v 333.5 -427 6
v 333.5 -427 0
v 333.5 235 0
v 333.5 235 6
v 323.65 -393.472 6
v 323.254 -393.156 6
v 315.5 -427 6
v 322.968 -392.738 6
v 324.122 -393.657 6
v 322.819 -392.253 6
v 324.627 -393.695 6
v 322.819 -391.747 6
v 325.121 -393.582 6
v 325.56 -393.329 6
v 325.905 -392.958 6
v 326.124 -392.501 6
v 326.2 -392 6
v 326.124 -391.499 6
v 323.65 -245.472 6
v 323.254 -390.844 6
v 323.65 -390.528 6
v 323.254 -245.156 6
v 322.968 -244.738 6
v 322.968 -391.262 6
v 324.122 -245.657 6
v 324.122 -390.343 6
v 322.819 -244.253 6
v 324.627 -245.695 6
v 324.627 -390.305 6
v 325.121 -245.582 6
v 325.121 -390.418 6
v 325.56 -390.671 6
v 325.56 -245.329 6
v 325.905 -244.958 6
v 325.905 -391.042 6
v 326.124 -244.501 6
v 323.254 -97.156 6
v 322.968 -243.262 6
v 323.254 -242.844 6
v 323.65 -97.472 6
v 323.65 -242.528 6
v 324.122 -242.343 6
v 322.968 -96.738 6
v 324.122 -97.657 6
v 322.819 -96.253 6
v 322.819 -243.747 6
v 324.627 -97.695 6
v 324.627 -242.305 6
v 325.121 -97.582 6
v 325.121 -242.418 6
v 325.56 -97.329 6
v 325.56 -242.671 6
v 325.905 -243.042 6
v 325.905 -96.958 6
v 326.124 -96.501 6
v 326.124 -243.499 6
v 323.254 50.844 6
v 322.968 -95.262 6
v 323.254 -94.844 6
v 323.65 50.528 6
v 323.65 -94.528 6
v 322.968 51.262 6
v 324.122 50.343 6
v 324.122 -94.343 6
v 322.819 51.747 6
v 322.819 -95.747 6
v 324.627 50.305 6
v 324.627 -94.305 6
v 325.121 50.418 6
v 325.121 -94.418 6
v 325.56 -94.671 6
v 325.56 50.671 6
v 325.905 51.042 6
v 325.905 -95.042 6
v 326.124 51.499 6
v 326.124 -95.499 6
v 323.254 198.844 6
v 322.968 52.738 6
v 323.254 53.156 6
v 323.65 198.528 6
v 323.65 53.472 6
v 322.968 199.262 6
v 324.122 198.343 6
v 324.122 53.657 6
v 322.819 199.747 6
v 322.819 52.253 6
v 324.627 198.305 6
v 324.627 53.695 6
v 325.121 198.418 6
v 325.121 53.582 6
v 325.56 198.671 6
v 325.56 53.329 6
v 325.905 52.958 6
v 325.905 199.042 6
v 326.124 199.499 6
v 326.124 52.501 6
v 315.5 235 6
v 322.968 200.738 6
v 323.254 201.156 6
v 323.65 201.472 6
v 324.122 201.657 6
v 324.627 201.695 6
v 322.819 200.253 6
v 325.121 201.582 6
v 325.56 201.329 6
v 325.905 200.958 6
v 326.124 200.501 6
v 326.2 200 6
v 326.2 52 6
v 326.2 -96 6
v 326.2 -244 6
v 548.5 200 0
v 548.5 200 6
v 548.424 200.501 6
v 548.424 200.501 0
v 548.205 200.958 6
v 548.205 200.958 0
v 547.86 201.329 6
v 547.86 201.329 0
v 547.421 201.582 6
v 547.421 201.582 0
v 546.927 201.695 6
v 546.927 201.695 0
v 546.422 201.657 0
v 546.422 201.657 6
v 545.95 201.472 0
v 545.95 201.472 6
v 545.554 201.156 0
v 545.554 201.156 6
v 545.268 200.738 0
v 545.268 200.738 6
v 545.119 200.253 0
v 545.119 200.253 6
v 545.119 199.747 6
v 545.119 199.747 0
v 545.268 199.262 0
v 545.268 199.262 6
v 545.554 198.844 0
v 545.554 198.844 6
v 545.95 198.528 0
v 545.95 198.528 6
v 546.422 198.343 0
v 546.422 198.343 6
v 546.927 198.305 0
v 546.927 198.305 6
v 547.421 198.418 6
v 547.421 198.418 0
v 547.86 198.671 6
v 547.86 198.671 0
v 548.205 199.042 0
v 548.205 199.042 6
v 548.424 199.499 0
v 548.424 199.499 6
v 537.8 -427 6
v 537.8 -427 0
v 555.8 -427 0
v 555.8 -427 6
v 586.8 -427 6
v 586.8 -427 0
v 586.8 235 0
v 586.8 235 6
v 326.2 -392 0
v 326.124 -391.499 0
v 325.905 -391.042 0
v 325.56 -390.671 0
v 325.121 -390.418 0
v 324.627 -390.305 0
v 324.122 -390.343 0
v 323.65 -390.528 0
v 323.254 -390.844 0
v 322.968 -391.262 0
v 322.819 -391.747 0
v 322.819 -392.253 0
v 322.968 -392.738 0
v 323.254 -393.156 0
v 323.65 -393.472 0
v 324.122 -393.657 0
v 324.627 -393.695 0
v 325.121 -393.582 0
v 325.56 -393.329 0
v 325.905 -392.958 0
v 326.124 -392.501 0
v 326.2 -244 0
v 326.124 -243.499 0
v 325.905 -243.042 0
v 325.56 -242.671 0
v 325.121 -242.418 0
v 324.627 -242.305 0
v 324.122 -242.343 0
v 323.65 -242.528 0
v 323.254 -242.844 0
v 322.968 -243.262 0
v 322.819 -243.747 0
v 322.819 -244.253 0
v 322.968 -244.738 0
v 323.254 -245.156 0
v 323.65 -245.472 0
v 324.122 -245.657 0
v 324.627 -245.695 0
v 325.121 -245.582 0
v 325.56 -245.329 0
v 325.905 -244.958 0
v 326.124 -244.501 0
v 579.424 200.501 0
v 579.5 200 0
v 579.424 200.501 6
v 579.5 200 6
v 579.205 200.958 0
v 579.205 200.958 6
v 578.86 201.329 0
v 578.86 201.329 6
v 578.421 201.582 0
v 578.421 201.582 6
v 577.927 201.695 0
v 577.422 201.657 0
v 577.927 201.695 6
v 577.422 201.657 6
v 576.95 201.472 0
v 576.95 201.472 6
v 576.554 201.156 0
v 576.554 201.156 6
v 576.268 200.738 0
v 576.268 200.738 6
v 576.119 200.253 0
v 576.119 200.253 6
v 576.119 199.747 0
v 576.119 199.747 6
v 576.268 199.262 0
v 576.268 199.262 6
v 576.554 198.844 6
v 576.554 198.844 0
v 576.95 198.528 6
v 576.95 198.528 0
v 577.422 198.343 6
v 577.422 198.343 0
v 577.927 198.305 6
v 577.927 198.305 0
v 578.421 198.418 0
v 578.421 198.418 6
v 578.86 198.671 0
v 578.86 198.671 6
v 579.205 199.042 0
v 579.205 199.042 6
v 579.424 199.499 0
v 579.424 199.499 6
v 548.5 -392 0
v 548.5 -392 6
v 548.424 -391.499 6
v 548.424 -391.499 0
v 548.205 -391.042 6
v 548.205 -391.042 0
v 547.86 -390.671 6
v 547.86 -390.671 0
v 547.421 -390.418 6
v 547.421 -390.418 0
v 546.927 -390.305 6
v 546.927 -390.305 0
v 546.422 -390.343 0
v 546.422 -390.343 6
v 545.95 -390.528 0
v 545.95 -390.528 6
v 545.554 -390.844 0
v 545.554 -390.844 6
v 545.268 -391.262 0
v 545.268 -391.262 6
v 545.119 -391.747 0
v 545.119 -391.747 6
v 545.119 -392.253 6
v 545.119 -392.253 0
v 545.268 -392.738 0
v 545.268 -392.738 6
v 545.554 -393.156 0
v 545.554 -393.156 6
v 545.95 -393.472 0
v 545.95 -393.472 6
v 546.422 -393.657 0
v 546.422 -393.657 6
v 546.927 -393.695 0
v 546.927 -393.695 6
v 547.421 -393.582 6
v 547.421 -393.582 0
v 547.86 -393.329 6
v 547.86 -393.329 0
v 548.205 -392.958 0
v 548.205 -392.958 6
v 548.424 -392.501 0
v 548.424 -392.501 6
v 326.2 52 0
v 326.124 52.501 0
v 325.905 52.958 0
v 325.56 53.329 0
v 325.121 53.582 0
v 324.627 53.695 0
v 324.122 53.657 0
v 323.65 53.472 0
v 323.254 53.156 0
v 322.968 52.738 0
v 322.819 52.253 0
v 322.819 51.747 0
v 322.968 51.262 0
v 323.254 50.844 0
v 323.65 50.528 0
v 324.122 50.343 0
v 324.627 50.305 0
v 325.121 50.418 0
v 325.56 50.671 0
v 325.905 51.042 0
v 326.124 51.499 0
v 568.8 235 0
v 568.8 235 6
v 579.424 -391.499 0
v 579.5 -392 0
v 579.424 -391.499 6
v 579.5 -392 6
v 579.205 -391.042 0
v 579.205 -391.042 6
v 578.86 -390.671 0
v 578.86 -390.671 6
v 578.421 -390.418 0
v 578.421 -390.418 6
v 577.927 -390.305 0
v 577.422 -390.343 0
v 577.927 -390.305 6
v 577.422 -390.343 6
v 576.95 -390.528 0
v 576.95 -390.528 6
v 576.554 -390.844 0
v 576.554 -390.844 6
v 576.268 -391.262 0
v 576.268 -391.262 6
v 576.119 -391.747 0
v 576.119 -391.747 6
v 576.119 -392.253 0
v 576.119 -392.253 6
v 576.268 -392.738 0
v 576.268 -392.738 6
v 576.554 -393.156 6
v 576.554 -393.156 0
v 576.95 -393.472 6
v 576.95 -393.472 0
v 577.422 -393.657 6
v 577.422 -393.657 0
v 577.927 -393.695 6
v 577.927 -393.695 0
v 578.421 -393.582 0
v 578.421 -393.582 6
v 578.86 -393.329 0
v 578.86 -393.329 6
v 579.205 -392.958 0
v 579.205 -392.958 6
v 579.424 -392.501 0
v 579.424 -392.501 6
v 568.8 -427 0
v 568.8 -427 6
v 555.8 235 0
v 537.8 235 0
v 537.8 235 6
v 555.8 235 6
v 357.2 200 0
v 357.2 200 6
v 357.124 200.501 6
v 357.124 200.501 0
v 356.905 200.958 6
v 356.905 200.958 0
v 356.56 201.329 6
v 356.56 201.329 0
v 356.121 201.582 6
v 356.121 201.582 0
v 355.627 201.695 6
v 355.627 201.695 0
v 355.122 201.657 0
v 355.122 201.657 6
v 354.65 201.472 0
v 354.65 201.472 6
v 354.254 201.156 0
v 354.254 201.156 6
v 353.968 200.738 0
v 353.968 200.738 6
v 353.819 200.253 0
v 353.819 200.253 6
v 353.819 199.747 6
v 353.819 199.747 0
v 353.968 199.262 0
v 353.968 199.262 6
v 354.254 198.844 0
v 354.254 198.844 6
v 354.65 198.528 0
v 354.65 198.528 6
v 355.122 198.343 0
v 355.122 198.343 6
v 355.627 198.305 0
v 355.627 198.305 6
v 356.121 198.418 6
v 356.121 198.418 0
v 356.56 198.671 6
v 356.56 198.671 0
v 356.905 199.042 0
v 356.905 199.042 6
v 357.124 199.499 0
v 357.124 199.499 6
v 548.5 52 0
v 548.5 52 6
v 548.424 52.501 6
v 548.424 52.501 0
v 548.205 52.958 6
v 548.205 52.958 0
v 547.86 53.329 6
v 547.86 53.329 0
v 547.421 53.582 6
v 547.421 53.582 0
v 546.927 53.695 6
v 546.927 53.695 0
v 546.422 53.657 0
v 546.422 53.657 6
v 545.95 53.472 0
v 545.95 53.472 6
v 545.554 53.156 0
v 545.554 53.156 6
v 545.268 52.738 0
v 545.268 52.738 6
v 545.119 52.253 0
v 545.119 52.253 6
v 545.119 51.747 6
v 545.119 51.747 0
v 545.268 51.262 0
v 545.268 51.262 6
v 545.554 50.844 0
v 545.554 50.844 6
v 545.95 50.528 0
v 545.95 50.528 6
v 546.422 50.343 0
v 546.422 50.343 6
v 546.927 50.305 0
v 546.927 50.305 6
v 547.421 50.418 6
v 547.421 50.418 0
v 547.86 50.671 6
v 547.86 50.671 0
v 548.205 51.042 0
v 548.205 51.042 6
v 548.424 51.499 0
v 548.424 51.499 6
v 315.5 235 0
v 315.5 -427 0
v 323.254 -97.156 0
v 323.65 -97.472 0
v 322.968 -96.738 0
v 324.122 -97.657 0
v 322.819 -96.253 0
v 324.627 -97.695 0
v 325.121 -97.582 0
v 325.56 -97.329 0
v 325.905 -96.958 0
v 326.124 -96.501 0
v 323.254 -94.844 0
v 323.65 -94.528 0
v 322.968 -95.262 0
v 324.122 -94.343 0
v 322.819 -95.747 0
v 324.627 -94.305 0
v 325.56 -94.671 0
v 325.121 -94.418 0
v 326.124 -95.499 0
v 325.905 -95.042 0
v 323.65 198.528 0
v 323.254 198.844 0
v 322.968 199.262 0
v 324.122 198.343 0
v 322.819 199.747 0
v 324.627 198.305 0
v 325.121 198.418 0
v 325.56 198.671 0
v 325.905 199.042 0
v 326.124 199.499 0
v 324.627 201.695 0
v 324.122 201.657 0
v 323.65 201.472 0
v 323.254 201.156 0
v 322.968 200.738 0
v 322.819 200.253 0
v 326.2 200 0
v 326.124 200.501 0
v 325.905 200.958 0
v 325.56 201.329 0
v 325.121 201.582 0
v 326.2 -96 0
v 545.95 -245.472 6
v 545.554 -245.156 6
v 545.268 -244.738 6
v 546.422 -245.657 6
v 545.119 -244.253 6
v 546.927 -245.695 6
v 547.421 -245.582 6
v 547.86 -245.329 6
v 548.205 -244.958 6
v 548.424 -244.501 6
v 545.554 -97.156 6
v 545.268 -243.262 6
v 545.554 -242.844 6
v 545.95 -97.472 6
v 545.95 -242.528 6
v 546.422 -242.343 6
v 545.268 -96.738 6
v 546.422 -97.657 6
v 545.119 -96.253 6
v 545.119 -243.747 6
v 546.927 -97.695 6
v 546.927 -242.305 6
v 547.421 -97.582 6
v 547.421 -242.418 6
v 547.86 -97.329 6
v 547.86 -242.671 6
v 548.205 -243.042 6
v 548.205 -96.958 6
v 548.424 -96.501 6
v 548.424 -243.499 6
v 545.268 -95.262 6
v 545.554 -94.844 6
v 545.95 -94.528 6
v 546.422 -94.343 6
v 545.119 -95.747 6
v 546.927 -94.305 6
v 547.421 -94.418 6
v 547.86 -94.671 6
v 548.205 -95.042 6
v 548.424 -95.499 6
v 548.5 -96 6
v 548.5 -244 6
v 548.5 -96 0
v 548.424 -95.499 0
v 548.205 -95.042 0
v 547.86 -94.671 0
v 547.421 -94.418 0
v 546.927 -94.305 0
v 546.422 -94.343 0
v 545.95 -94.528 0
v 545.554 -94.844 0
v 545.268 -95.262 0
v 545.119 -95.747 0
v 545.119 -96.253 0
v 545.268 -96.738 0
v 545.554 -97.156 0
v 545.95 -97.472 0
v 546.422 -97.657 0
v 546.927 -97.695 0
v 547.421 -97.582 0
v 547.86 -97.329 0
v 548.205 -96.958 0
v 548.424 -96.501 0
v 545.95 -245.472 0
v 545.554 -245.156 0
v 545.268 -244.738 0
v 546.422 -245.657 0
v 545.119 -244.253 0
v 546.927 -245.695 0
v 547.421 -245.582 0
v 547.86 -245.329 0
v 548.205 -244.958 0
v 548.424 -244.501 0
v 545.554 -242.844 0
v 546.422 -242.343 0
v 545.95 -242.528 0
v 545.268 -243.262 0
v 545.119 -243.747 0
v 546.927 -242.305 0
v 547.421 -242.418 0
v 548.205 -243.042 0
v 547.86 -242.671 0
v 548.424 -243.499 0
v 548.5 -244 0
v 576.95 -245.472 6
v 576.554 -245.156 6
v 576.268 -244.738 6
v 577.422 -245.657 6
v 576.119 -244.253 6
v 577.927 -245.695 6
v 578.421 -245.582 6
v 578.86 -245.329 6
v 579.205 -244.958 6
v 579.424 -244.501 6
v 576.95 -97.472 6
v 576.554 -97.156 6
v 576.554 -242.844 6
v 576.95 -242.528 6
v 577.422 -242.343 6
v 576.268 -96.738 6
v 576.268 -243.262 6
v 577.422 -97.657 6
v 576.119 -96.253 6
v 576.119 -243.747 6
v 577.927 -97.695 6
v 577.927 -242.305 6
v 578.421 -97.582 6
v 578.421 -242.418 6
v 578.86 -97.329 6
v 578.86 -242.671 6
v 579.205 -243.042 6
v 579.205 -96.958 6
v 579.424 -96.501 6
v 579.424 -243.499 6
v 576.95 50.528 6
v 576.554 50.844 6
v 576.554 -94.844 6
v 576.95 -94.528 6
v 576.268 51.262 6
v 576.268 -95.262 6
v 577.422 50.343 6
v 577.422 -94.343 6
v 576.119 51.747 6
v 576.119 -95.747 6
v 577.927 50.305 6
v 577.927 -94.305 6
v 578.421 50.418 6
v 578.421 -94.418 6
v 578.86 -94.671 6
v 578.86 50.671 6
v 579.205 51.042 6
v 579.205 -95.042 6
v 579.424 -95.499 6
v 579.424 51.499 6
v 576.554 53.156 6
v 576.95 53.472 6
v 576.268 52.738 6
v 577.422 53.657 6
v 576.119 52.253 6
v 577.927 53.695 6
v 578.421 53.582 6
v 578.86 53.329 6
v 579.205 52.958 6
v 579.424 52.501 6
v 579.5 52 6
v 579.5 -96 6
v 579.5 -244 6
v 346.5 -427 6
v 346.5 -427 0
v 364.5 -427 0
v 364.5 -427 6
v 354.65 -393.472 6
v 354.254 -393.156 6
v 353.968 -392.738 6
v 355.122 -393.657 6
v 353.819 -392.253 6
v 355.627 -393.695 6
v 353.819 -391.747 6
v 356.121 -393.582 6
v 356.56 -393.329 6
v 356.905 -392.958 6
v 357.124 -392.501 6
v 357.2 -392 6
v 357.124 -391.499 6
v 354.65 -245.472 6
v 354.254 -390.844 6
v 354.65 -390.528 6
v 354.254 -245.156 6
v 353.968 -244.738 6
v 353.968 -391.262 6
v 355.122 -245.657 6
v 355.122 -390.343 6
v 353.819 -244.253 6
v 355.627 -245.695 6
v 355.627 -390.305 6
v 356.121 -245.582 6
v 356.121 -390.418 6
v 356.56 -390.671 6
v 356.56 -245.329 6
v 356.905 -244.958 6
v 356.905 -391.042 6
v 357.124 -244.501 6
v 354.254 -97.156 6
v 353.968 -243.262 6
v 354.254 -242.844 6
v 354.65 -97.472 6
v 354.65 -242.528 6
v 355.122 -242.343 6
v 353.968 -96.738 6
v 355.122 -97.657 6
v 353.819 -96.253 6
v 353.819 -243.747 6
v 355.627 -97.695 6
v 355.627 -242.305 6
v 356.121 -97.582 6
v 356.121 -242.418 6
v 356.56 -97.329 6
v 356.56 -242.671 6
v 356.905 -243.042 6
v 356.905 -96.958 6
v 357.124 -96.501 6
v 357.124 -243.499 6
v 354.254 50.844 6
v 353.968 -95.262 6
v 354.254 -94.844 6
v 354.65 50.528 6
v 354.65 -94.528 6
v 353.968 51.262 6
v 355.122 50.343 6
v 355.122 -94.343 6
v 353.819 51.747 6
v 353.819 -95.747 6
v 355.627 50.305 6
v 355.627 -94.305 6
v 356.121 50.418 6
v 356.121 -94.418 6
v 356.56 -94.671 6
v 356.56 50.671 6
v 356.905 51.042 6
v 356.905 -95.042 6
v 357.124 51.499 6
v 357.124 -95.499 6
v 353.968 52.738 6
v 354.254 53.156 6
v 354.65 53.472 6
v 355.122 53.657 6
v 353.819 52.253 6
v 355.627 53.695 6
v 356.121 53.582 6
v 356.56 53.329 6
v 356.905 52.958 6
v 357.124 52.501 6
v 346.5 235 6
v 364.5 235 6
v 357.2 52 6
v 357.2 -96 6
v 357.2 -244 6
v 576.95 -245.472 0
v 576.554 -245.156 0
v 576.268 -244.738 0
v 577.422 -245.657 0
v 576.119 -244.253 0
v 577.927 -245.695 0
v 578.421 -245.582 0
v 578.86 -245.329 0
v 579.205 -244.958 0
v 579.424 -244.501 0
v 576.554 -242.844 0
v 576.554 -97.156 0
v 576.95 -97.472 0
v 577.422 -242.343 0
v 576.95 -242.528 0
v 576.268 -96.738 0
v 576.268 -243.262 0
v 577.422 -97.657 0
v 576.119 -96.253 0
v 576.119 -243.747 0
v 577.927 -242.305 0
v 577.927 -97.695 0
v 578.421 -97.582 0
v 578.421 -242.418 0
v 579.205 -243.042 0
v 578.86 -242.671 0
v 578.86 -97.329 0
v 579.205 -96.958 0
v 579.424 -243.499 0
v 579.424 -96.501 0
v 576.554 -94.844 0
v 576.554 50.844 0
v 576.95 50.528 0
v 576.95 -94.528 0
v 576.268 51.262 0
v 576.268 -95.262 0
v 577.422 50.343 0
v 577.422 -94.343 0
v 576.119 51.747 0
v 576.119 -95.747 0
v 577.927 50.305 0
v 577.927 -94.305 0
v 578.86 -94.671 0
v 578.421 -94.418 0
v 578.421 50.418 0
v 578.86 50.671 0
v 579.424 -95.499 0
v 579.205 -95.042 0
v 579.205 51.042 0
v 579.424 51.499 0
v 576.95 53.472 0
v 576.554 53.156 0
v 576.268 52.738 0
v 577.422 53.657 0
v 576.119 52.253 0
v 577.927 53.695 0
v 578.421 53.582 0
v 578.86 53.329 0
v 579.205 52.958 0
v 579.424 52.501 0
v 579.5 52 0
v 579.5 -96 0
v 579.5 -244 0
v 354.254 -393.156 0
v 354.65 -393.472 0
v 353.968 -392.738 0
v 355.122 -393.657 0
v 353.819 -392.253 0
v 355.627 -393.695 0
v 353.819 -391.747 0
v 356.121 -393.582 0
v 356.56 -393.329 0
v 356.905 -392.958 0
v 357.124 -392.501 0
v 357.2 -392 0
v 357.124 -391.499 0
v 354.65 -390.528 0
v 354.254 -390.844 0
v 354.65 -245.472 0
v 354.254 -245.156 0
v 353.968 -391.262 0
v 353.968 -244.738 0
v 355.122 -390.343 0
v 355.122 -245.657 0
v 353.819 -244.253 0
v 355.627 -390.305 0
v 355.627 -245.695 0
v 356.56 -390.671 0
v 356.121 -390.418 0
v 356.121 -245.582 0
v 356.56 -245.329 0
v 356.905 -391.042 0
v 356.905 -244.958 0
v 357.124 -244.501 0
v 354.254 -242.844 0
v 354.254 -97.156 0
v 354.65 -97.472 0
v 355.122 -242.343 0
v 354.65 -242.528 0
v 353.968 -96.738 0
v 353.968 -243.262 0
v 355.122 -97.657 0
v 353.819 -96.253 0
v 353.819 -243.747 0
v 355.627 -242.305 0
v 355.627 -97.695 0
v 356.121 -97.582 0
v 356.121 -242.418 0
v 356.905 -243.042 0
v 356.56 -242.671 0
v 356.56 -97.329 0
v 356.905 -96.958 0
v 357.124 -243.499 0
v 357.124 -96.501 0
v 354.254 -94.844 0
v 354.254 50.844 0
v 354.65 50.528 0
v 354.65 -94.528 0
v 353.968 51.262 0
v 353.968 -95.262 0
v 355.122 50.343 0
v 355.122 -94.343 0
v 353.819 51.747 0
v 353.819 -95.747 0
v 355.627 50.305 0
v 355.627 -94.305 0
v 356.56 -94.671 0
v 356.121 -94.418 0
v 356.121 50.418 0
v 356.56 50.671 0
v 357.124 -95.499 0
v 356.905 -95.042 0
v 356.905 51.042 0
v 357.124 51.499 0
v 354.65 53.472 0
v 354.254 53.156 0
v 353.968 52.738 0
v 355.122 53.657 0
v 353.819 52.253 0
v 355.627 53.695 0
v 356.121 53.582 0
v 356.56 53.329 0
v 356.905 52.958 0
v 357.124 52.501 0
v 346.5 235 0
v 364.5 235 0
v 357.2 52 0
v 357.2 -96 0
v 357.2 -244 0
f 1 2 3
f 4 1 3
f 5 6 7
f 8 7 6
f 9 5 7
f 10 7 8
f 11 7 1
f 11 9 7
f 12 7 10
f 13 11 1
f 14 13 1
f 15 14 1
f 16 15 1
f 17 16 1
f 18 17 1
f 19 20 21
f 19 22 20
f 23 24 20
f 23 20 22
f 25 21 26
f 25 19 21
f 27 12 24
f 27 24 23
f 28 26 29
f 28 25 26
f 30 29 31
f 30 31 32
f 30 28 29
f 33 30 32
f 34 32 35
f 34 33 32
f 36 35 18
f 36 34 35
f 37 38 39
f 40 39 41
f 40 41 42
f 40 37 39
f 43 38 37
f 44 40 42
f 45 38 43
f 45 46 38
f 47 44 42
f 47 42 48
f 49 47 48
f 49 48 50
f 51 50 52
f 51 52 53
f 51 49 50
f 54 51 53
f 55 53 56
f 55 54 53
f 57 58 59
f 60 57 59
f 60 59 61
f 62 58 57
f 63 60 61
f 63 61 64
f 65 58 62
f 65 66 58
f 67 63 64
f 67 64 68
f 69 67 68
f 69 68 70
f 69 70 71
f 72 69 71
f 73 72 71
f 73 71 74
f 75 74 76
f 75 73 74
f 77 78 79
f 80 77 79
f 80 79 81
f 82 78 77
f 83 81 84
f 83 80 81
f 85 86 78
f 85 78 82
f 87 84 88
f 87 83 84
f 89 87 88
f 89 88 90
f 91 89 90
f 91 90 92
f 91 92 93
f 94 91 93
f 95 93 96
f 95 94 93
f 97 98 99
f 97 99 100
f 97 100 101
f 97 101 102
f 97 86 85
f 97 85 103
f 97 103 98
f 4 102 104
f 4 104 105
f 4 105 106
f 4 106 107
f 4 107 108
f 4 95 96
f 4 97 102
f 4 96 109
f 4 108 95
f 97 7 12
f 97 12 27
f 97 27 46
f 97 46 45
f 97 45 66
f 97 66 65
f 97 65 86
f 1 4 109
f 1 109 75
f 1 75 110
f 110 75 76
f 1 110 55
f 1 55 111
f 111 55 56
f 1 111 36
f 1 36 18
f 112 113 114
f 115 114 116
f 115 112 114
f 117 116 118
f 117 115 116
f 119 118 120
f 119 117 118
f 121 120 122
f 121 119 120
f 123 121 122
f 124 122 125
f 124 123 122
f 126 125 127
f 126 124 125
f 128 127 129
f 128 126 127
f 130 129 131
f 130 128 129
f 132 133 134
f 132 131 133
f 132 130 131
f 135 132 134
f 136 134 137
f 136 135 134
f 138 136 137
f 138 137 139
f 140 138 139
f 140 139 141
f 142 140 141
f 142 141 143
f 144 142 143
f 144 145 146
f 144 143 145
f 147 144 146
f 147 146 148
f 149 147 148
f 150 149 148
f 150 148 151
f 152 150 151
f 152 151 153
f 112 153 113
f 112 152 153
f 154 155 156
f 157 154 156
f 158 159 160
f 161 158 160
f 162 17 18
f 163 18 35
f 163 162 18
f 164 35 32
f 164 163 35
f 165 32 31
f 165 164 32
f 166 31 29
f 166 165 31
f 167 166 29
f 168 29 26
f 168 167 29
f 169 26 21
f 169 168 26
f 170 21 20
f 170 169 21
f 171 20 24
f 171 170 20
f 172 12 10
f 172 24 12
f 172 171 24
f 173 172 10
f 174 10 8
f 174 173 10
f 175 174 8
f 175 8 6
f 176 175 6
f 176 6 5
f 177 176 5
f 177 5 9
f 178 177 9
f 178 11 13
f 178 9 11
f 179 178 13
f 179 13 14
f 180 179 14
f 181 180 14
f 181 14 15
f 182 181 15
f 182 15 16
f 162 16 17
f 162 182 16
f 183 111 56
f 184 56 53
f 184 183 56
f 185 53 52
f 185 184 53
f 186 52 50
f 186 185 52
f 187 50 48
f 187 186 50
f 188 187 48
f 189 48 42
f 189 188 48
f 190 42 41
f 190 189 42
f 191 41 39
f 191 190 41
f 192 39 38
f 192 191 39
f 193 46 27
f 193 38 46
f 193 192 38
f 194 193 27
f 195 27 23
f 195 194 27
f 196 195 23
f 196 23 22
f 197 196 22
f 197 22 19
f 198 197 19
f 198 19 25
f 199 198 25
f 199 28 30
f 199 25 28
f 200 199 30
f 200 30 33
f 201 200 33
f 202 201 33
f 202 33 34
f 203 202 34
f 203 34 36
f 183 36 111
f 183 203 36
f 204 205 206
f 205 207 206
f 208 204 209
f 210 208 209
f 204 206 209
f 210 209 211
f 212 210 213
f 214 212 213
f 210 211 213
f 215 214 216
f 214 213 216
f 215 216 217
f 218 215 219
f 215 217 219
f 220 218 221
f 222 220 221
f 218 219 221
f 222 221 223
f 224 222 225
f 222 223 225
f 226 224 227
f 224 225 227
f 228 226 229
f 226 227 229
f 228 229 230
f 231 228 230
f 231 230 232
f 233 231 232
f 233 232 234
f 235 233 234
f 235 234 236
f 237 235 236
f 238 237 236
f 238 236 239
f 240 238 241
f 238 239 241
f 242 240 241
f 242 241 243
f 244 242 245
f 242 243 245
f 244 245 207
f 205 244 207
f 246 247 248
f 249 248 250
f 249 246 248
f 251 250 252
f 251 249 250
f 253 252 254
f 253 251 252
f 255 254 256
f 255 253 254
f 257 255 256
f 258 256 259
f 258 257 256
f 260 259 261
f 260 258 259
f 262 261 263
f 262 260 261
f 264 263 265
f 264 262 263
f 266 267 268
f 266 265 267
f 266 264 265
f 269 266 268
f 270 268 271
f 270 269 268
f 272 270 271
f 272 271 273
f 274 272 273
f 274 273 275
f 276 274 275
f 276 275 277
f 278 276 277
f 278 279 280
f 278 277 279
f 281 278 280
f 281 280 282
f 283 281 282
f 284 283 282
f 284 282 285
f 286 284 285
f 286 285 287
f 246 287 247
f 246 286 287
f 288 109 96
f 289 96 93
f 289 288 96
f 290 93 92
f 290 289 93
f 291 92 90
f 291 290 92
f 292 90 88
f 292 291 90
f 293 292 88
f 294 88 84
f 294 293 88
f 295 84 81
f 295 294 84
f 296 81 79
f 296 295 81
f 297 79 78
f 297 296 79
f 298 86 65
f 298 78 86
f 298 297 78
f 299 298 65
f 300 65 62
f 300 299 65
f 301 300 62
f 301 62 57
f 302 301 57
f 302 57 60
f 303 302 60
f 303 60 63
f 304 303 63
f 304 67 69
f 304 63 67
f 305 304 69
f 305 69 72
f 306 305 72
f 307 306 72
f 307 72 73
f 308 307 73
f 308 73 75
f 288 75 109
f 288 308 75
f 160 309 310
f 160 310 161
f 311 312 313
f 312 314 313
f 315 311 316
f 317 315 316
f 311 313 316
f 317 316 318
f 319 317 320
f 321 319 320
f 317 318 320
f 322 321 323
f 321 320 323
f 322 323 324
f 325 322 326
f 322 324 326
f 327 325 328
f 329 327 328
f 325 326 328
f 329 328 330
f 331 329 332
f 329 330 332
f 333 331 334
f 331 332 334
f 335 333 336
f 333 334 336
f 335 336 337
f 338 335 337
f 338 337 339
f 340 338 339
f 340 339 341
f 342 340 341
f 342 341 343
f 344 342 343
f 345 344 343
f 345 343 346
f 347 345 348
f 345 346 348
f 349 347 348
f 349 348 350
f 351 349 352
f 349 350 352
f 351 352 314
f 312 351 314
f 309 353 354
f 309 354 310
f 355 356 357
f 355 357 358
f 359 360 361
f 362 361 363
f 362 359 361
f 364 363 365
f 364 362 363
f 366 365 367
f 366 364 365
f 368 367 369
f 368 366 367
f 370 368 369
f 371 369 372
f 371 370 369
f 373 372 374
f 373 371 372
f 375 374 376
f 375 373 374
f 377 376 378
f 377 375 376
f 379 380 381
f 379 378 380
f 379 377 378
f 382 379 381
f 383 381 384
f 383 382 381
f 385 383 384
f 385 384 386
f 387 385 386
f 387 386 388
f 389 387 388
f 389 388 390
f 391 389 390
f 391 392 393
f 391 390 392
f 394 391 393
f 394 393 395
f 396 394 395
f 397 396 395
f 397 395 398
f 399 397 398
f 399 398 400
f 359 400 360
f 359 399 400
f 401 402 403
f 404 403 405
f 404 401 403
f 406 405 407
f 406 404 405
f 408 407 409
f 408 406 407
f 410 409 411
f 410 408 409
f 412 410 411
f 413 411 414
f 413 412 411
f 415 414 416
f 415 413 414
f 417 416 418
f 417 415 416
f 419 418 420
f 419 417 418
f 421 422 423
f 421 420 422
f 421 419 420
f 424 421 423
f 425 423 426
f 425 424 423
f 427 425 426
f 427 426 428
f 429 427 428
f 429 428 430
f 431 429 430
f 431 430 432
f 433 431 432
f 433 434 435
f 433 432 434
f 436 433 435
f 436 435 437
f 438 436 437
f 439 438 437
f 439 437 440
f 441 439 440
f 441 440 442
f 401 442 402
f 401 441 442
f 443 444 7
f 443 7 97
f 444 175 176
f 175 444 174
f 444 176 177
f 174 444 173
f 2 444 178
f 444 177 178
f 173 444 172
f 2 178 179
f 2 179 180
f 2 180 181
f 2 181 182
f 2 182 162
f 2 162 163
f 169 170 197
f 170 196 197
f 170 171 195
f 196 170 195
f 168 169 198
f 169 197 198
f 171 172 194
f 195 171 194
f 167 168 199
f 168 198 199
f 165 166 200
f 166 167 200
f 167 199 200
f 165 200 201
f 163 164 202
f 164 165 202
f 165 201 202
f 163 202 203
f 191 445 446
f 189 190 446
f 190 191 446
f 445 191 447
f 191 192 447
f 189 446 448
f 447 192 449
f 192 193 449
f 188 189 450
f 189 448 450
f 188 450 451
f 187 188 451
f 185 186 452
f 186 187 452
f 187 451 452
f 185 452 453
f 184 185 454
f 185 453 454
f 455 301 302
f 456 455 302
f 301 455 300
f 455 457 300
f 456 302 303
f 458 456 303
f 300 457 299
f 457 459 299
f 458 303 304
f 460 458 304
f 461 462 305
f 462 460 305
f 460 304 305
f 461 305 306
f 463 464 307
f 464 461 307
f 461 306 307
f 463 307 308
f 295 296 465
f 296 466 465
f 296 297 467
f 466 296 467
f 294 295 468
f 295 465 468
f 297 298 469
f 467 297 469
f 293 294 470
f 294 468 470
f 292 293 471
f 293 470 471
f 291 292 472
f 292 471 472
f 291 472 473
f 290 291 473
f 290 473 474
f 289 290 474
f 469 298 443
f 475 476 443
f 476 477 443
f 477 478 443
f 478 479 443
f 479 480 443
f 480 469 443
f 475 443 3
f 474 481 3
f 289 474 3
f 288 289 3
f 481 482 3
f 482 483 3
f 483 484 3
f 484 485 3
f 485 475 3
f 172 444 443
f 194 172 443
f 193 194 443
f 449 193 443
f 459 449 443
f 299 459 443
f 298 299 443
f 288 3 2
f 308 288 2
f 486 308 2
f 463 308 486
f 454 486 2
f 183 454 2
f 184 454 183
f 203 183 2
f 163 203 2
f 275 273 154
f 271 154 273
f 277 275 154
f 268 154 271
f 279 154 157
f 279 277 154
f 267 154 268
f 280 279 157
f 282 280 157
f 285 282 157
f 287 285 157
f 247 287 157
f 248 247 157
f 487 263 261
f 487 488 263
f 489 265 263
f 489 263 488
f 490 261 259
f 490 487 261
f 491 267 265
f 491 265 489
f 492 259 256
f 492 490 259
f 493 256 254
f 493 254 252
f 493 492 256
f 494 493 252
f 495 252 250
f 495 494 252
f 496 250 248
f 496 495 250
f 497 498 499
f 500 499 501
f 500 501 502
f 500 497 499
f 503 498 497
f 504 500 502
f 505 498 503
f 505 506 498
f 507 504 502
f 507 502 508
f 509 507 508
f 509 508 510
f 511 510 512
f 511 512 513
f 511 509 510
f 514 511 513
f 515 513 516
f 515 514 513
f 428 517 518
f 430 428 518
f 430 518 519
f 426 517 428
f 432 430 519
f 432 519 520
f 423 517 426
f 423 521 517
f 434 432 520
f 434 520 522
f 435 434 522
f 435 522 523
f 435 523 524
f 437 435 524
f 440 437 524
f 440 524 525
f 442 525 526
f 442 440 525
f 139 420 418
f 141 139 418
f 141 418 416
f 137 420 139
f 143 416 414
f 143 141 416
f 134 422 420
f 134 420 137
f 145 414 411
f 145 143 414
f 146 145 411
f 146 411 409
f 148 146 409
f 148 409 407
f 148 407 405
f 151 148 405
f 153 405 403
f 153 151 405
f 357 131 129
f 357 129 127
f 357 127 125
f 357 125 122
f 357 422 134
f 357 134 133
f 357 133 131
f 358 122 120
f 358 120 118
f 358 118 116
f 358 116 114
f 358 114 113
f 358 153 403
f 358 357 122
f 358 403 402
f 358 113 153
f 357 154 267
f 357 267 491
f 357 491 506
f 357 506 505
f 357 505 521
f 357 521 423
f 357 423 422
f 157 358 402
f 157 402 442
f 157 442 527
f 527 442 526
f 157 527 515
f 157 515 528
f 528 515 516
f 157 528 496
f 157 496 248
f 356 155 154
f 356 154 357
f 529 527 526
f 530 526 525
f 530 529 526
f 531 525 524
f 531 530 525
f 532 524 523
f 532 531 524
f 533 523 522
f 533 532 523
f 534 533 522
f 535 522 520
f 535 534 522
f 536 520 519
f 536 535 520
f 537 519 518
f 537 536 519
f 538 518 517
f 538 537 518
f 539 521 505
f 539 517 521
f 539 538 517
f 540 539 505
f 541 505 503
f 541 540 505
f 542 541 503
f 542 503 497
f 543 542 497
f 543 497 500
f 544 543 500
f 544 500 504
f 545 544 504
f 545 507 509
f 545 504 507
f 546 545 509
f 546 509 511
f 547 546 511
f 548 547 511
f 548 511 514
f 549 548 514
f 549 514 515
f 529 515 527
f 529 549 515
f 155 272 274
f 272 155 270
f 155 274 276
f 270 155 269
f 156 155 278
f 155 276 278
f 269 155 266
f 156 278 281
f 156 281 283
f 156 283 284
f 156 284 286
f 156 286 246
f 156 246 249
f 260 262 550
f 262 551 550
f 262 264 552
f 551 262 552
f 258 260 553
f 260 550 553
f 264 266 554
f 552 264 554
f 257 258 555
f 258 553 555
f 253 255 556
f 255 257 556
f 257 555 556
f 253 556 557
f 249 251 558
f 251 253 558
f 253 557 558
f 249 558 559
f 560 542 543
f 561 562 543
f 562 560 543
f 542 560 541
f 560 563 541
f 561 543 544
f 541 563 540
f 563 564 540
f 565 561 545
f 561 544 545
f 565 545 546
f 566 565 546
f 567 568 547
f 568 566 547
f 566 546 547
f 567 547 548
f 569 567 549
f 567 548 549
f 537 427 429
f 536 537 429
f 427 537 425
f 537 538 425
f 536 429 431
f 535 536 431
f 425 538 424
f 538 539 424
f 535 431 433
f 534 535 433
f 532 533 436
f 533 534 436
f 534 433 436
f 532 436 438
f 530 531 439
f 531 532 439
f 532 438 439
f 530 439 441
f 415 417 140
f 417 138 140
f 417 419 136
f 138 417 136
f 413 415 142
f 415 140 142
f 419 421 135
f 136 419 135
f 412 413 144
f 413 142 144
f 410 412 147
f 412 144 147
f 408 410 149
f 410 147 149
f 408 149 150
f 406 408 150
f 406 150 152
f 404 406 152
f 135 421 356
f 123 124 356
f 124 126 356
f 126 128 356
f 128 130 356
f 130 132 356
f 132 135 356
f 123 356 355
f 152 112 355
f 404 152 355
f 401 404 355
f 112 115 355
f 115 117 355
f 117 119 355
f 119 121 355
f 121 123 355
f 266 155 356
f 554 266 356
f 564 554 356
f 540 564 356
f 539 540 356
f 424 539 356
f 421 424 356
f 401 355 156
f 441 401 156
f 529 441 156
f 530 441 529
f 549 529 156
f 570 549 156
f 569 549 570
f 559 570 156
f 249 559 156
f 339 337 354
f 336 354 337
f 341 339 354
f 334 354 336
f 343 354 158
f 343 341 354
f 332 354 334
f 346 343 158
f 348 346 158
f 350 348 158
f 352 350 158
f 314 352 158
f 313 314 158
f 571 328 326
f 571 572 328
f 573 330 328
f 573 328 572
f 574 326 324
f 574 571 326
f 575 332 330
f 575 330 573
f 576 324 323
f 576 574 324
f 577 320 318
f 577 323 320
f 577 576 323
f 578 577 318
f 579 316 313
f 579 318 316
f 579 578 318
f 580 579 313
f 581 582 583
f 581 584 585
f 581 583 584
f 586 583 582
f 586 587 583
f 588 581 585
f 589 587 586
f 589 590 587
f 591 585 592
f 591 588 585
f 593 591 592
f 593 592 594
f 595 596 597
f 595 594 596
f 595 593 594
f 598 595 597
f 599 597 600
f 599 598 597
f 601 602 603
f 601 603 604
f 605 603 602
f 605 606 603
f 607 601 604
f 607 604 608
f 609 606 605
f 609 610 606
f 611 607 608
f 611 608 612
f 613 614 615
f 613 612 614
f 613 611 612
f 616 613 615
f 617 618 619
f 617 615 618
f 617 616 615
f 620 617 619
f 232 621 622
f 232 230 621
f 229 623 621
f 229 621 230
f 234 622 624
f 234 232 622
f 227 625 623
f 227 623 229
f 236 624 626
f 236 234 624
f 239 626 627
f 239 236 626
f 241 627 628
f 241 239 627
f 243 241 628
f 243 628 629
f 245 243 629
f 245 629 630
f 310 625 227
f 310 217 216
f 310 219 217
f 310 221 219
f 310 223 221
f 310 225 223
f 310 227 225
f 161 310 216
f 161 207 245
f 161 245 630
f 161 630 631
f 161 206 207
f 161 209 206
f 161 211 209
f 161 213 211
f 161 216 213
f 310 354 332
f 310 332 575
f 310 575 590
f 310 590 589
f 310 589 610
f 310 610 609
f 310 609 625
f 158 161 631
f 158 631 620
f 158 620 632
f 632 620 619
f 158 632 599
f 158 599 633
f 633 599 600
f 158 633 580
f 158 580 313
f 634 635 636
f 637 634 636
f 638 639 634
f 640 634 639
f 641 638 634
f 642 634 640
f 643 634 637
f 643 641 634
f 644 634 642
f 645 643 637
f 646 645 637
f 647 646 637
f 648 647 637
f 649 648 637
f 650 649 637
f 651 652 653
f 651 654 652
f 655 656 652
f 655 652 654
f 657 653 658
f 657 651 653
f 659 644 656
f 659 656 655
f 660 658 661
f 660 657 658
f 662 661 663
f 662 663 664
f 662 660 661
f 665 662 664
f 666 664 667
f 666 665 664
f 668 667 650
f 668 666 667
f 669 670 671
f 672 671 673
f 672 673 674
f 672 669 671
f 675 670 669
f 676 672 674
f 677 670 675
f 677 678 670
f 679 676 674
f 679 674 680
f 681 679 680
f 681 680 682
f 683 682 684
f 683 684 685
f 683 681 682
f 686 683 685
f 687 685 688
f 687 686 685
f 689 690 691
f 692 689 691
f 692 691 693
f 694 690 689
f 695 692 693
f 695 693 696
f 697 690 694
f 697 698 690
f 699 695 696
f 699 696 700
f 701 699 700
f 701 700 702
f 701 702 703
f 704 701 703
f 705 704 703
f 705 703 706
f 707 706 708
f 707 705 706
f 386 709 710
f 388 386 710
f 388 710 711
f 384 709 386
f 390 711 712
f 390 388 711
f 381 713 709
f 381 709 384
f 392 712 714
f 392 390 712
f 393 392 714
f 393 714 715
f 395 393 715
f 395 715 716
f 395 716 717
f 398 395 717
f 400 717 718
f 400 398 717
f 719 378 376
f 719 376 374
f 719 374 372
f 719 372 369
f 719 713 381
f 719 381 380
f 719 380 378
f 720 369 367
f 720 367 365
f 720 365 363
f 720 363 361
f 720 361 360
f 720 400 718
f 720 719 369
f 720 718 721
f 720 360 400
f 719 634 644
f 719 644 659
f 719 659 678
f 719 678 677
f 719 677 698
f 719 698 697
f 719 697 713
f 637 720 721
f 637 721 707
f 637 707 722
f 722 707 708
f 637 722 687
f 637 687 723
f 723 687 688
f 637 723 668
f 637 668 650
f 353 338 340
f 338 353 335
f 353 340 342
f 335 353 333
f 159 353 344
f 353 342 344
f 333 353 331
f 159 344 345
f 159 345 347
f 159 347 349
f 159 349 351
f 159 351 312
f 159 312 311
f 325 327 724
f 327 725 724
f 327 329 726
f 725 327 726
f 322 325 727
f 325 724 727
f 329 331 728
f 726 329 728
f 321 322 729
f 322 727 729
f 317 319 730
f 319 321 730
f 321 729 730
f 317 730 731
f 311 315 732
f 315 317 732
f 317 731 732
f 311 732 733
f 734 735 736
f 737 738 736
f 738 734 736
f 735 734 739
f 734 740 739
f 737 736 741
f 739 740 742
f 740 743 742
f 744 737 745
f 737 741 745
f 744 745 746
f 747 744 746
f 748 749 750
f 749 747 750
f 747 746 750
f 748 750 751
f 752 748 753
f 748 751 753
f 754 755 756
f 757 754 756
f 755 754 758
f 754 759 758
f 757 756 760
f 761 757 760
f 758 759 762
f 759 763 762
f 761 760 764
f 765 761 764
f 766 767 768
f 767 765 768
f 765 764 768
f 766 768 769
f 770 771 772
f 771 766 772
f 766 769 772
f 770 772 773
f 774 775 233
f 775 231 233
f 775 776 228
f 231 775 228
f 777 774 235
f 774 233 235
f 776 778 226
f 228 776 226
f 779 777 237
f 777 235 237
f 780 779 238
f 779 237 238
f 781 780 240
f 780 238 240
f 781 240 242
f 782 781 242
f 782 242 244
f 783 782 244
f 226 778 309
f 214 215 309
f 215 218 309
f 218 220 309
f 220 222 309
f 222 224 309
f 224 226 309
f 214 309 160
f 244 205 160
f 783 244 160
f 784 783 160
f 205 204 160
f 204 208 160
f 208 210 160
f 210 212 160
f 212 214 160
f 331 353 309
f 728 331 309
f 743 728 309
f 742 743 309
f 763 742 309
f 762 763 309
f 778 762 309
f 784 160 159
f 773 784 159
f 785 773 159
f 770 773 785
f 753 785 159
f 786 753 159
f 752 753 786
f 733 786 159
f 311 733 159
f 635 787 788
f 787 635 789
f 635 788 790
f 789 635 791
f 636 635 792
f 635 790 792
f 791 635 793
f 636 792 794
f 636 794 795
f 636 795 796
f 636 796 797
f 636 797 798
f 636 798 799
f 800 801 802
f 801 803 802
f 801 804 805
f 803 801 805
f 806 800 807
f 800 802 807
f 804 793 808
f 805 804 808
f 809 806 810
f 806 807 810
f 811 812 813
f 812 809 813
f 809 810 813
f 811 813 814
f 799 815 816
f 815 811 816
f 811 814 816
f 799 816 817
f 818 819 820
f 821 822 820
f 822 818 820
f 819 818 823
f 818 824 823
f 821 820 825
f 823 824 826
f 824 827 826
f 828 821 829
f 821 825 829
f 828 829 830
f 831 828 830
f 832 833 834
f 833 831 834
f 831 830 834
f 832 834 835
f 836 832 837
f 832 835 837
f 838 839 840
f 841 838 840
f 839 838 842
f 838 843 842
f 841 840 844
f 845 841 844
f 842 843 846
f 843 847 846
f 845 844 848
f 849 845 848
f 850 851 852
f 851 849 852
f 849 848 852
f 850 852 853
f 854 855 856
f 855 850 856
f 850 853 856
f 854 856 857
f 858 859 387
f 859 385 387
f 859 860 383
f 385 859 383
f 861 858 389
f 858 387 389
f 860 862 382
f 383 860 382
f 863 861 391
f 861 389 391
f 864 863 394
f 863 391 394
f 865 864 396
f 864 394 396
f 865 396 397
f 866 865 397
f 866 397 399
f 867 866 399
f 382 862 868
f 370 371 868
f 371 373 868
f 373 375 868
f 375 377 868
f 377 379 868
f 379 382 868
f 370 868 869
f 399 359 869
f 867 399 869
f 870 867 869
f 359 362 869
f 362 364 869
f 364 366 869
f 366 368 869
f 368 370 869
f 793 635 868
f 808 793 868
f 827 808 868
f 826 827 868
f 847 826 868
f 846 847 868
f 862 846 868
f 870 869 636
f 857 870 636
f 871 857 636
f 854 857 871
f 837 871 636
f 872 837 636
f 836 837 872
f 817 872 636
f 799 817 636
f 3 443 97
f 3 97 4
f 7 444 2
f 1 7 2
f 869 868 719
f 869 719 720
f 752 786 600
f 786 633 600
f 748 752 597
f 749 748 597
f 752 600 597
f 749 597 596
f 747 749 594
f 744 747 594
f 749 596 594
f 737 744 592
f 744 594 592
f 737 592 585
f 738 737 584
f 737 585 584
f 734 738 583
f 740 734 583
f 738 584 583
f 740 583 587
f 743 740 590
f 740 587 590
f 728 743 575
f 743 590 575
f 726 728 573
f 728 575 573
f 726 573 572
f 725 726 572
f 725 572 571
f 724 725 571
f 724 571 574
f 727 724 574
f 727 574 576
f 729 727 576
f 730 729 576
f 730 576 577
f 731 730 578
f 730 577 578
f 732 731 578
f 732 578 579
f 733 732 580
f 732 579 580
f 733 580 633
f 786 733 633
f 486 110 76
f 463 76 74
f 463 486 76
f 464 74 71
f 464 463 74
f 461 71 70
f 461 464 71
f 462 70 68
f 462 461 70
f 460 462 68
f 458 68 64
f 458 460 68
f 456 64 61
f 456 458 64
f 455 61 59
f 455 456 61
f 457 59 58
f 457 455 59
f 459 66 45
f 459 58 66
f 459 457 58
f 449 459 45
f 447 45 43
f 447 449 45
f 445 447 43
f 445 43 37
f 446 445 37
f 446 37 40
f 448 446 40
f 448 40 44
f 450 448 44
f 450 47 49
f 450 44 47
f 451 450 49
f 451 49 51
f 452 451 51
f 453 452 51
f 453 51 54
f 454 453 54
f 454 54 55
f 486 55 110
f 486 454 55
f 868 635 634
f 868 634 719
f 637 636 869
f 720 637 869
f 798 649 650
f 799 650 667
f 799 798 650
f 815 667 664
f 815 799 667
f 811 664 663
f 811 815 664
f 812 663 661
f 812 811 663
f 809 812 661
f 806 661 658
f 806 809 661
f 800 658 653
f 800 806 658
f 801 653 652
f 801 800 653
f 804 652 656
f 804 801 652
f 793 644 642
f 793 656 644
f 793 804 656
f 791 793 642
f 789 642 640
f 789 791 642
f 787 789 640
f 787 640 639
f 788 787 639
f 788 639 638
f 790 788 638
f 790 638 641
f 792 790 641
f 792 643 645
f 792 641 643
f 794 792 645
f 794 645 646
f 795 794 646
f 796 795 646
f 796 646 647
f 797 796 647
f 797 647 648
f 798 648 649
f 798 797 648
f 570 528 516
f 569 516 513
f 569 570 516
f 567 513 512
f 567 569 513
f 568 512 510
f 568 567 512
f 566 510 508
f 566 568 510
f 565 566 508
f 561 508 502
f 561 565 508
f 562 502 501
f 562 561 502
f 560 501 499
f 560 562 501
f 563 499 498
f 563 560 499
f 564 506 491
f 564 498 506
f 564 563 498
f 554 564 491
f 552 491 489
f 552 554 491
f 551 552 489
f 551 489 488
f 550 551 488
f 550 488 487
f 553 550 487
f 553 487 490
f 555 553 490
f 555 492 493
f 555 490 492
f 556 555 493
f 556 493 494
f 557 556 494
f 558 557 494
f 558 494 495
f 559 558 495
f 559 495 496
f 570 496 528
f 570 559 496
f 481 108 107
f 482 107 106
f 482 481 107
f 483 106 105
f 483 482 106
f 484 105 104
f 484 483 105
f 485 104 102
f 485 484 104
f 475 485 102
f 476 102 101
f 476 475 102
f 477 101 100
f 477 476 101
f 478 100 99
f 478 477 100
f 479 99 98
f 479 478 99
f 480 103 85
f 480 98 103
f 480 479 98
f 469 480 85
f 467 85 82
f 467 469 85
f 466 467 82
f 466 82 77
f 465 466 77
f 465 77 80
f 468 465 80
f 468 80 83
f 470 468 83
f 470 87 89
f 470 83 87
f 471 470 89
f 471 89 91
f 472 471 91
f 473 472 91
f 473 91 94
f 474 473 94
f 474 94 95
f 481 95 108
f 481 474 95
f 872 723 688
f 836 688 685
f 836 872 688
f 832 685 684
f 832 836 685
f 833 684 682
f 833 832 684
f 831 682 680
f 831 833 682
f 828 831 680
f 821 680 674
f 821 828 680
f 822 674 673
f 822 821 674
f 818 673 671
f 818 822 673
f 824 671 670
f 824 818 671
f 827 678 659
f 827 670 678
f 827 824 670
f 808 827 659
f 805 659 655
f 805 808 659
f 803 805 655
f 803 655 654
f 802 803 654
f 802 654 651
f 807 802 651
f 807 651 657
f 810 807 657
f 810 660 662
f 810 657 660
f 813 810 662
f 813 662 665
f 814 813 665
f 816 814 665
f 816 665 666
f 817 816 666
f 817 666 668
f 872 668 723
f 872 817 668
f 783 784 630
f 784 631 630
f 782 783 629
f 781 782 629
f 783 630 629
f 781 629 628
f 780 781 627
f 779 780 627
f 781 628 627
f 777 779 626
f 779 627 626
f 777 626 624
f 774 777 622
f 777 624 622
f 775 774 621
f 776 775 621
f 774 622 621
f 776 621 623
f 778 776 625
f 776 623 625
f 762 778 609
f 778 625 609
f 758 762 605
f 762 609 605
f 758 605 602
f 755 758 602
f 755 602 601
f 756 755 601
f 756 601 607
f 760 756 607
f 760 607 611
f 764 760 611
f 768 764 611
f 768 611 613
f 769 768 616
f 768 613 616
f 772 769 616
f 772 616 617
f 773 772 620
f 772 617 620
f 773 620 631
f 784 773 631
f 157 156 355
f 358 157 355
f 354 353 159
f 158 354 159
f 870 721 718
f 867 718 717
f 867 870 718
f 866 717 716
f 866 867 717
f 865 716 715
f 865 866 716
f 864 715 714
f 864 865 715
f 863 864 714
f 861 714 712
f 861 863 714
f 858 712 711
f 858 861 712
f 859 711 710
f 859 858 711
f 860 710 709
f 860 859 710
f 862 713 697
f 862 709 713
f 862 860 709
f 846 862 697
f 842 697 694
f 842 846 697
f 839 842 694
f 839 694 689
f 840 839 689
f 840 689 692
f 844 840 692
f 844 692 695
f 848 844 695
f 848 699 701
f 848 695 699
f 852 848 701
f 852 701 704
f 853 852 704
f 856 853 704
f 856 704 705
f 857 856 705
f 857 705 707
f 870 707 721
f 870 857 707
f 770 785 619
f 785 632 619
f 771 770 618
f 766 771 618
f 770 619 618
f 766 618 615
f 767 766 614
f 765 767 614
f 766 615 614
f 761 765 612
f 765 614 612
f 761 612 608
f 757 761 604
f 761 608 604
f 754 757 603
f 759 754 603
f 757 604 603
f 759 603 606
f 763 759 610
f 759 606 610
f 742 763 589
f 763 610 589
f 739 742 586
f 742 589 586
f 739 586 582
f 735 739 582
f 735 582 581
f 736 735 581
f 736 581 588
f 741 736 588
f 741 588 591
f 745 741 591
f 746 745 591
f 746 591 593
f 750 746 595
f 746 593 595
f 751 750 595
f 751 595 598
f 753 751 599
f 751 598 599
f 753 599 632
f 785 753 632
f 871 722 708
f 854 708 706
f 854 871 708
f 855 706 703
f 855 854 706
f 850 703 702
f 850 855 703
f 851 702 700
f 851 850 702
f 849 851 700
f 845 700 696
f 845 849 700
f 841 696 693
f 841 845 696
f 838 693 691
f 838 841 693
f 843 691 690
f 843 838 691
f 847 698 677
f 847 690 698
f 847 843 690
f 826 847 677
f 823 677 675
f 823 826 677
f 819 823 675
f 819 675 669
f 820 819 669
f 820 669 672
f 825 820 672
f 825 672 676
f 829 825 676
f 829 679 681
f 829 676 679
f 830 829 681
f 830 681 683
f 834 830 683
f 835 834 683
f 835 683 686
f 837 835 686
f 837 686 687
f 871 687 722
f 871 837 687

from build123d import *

# Parameters (mm, degrees)
SKETCH_1760_W          = 18
SKETCH_1760_H          = 662
EXTRUDE_6_DEPTH        = 6
EXTRUDE_6_2_DEPTH      = 6
EXTRUDE_6_3_DEPTH      = 6
EXTRUDE_6_4_DEPTH      = 6
SKETCH_3_R             = 1.7
CUT_EXTRUDE_3_DEPTH    = 726.74047703
PATTERN_LINEAR_5_COUNT = 5
PATTERN_LINEAR_5_PITCH = 148


with BuildPart() as part:
    # Sketch 1760 → Четыре_направляющие_6мм (new body)
    with BuildSketch(Plane.XY):
        with Locations((324.5, -96)):
            Rectangle(SKETCH_1760_W, SKETCH_1760_H)
    extrude(amount=EXTRUDE_6_DEPTH)


with BuildPart() as body_2:
    # Sketch 1760 → Extrude 6 2 (new body)
    with BuildSketch(Plane.XY):
        with Locations((355.5, -96)):
            Rectangle(SKETCH_1760_W, SKETCH_1760_H)
    extrude(amount=EXTRUDE_6_2_DEPTH)


with BuildPart() as body_3:
    # Sketch 1760 → Extrude 6 3 (new body)
    with BuildSketch(Plane.XY):
        with Locations((546.8, -96)):
            Rectangle(SKETCH_1760_W, SKETCH_1760_H)
    extrude(amount=EXTRUDE_6_3_DEPTH)


with BuildPart() as body_4:
    # Sketch 1760 → Extrude 6 4 (new body)
    with BuildSketch(Plane.XY):
        with Locations((577.8, -96)):
            Rectangle(SKETCH_1760_W, SKETCH_1760_H)
    extrude(amount=EXTRUDE_6_4_DEPTH)


with BuildPart() as cut_extrude_3_tool:
    # Крепление_направляющих_М3_эскиз → Проходы_направляющих_М3 (new, symmetric)
    with BuildSketch(Plane.XY):
        with Locations((324.5, -392)):
            Circle(SKETCH_3_R)
        with Locations((355.5, -392)):
            Circle(SKETCH_3_R)
        with Locations((546.8, -392)):
            Circle(SKETCH_3_R)
        with Locations((577.8, -392)):
            Circle(SKETCH_3_R)
    cut_extrude_3 = extrude(amount=CUT_EXTRUDE_3_DEPTH, both=True)


with BuildPart() as part_1:
    add(part.part)

    # Проходы_направляющих_М3: cut by cut_extrude_3_tool
    add(cut_extrude_3_tool.part, mode=Mode.SUBTRACT)


with BuildPart() as body_2_1:
    add(body_2.part)

    # Проходы_направляющих_М3: cut by cut_extrude_3_tool
    add(cut_extrude_3_tool.part, mode=Mode.SUBTRACT)


with BuildPart() as body_3_1:
    add(body_3.part)

    # Проходы_направляющих_М3: cut by cut_extrude_3_tool
    add(cut_extrude_3_tool.part, mode=Mode.SUBTRACT)


with BuildPart() as body_4_1:
    add(body_4.part)

    # Проходы_направляющих_М3: cut by cut_extrude_3_tool
    add(cut_extrude_3_tool.part, mode=Mode.SUBTRACT)


with BuildPart() as pattern_linear_5_tool:
    # Массив_крепления_направляющих_5рядов: Проходы_направляющих_М3 ×5
    with Locations(*[(0, i * PATTERN_LINEAR_5_PITCH, 0) for i in range(1, PATTERN_LINEAR_5_COUNT)]):
        add(cut_extrude_3)


with BuildPart() as part_2:
    add(part_1.part)

    # Массив_крепления_направляющих_5рядов: cut by pattern_linear_5_tool
    add(pattern_linear_5_tool.part, mode=Mode.SUBTRACT)


with BuildPart() as body_2_2:
    add(body_2_1.part)

    # Массив_крепления_направляющих_5рядов: cut by pattern_linear_5_tool
    add(pattern_linear_5_tool.part, mode=Mode.SUBTRACT)


with BuildPart() as body_3_2:
    add(body_3_1.part)

    # Массив_крепления_направляющих_5рядов: cut by pattern_linear_5_tool
    add(pattern_linear_5_tool.part, mode=Mode.SUBTRACT)


with BuildPart() as body_4_2:
    add(body_4_1.part)

    # Массив_крепления_направляющих_5рядов: cut by pattern_linear_5_tool
    add(pattern_linear_5_tool.part, mode=Mode.SUBTRACT)


solid = Compound([part_2.part, body_2_2.part, body_3_2.part, body_4_2.part])
